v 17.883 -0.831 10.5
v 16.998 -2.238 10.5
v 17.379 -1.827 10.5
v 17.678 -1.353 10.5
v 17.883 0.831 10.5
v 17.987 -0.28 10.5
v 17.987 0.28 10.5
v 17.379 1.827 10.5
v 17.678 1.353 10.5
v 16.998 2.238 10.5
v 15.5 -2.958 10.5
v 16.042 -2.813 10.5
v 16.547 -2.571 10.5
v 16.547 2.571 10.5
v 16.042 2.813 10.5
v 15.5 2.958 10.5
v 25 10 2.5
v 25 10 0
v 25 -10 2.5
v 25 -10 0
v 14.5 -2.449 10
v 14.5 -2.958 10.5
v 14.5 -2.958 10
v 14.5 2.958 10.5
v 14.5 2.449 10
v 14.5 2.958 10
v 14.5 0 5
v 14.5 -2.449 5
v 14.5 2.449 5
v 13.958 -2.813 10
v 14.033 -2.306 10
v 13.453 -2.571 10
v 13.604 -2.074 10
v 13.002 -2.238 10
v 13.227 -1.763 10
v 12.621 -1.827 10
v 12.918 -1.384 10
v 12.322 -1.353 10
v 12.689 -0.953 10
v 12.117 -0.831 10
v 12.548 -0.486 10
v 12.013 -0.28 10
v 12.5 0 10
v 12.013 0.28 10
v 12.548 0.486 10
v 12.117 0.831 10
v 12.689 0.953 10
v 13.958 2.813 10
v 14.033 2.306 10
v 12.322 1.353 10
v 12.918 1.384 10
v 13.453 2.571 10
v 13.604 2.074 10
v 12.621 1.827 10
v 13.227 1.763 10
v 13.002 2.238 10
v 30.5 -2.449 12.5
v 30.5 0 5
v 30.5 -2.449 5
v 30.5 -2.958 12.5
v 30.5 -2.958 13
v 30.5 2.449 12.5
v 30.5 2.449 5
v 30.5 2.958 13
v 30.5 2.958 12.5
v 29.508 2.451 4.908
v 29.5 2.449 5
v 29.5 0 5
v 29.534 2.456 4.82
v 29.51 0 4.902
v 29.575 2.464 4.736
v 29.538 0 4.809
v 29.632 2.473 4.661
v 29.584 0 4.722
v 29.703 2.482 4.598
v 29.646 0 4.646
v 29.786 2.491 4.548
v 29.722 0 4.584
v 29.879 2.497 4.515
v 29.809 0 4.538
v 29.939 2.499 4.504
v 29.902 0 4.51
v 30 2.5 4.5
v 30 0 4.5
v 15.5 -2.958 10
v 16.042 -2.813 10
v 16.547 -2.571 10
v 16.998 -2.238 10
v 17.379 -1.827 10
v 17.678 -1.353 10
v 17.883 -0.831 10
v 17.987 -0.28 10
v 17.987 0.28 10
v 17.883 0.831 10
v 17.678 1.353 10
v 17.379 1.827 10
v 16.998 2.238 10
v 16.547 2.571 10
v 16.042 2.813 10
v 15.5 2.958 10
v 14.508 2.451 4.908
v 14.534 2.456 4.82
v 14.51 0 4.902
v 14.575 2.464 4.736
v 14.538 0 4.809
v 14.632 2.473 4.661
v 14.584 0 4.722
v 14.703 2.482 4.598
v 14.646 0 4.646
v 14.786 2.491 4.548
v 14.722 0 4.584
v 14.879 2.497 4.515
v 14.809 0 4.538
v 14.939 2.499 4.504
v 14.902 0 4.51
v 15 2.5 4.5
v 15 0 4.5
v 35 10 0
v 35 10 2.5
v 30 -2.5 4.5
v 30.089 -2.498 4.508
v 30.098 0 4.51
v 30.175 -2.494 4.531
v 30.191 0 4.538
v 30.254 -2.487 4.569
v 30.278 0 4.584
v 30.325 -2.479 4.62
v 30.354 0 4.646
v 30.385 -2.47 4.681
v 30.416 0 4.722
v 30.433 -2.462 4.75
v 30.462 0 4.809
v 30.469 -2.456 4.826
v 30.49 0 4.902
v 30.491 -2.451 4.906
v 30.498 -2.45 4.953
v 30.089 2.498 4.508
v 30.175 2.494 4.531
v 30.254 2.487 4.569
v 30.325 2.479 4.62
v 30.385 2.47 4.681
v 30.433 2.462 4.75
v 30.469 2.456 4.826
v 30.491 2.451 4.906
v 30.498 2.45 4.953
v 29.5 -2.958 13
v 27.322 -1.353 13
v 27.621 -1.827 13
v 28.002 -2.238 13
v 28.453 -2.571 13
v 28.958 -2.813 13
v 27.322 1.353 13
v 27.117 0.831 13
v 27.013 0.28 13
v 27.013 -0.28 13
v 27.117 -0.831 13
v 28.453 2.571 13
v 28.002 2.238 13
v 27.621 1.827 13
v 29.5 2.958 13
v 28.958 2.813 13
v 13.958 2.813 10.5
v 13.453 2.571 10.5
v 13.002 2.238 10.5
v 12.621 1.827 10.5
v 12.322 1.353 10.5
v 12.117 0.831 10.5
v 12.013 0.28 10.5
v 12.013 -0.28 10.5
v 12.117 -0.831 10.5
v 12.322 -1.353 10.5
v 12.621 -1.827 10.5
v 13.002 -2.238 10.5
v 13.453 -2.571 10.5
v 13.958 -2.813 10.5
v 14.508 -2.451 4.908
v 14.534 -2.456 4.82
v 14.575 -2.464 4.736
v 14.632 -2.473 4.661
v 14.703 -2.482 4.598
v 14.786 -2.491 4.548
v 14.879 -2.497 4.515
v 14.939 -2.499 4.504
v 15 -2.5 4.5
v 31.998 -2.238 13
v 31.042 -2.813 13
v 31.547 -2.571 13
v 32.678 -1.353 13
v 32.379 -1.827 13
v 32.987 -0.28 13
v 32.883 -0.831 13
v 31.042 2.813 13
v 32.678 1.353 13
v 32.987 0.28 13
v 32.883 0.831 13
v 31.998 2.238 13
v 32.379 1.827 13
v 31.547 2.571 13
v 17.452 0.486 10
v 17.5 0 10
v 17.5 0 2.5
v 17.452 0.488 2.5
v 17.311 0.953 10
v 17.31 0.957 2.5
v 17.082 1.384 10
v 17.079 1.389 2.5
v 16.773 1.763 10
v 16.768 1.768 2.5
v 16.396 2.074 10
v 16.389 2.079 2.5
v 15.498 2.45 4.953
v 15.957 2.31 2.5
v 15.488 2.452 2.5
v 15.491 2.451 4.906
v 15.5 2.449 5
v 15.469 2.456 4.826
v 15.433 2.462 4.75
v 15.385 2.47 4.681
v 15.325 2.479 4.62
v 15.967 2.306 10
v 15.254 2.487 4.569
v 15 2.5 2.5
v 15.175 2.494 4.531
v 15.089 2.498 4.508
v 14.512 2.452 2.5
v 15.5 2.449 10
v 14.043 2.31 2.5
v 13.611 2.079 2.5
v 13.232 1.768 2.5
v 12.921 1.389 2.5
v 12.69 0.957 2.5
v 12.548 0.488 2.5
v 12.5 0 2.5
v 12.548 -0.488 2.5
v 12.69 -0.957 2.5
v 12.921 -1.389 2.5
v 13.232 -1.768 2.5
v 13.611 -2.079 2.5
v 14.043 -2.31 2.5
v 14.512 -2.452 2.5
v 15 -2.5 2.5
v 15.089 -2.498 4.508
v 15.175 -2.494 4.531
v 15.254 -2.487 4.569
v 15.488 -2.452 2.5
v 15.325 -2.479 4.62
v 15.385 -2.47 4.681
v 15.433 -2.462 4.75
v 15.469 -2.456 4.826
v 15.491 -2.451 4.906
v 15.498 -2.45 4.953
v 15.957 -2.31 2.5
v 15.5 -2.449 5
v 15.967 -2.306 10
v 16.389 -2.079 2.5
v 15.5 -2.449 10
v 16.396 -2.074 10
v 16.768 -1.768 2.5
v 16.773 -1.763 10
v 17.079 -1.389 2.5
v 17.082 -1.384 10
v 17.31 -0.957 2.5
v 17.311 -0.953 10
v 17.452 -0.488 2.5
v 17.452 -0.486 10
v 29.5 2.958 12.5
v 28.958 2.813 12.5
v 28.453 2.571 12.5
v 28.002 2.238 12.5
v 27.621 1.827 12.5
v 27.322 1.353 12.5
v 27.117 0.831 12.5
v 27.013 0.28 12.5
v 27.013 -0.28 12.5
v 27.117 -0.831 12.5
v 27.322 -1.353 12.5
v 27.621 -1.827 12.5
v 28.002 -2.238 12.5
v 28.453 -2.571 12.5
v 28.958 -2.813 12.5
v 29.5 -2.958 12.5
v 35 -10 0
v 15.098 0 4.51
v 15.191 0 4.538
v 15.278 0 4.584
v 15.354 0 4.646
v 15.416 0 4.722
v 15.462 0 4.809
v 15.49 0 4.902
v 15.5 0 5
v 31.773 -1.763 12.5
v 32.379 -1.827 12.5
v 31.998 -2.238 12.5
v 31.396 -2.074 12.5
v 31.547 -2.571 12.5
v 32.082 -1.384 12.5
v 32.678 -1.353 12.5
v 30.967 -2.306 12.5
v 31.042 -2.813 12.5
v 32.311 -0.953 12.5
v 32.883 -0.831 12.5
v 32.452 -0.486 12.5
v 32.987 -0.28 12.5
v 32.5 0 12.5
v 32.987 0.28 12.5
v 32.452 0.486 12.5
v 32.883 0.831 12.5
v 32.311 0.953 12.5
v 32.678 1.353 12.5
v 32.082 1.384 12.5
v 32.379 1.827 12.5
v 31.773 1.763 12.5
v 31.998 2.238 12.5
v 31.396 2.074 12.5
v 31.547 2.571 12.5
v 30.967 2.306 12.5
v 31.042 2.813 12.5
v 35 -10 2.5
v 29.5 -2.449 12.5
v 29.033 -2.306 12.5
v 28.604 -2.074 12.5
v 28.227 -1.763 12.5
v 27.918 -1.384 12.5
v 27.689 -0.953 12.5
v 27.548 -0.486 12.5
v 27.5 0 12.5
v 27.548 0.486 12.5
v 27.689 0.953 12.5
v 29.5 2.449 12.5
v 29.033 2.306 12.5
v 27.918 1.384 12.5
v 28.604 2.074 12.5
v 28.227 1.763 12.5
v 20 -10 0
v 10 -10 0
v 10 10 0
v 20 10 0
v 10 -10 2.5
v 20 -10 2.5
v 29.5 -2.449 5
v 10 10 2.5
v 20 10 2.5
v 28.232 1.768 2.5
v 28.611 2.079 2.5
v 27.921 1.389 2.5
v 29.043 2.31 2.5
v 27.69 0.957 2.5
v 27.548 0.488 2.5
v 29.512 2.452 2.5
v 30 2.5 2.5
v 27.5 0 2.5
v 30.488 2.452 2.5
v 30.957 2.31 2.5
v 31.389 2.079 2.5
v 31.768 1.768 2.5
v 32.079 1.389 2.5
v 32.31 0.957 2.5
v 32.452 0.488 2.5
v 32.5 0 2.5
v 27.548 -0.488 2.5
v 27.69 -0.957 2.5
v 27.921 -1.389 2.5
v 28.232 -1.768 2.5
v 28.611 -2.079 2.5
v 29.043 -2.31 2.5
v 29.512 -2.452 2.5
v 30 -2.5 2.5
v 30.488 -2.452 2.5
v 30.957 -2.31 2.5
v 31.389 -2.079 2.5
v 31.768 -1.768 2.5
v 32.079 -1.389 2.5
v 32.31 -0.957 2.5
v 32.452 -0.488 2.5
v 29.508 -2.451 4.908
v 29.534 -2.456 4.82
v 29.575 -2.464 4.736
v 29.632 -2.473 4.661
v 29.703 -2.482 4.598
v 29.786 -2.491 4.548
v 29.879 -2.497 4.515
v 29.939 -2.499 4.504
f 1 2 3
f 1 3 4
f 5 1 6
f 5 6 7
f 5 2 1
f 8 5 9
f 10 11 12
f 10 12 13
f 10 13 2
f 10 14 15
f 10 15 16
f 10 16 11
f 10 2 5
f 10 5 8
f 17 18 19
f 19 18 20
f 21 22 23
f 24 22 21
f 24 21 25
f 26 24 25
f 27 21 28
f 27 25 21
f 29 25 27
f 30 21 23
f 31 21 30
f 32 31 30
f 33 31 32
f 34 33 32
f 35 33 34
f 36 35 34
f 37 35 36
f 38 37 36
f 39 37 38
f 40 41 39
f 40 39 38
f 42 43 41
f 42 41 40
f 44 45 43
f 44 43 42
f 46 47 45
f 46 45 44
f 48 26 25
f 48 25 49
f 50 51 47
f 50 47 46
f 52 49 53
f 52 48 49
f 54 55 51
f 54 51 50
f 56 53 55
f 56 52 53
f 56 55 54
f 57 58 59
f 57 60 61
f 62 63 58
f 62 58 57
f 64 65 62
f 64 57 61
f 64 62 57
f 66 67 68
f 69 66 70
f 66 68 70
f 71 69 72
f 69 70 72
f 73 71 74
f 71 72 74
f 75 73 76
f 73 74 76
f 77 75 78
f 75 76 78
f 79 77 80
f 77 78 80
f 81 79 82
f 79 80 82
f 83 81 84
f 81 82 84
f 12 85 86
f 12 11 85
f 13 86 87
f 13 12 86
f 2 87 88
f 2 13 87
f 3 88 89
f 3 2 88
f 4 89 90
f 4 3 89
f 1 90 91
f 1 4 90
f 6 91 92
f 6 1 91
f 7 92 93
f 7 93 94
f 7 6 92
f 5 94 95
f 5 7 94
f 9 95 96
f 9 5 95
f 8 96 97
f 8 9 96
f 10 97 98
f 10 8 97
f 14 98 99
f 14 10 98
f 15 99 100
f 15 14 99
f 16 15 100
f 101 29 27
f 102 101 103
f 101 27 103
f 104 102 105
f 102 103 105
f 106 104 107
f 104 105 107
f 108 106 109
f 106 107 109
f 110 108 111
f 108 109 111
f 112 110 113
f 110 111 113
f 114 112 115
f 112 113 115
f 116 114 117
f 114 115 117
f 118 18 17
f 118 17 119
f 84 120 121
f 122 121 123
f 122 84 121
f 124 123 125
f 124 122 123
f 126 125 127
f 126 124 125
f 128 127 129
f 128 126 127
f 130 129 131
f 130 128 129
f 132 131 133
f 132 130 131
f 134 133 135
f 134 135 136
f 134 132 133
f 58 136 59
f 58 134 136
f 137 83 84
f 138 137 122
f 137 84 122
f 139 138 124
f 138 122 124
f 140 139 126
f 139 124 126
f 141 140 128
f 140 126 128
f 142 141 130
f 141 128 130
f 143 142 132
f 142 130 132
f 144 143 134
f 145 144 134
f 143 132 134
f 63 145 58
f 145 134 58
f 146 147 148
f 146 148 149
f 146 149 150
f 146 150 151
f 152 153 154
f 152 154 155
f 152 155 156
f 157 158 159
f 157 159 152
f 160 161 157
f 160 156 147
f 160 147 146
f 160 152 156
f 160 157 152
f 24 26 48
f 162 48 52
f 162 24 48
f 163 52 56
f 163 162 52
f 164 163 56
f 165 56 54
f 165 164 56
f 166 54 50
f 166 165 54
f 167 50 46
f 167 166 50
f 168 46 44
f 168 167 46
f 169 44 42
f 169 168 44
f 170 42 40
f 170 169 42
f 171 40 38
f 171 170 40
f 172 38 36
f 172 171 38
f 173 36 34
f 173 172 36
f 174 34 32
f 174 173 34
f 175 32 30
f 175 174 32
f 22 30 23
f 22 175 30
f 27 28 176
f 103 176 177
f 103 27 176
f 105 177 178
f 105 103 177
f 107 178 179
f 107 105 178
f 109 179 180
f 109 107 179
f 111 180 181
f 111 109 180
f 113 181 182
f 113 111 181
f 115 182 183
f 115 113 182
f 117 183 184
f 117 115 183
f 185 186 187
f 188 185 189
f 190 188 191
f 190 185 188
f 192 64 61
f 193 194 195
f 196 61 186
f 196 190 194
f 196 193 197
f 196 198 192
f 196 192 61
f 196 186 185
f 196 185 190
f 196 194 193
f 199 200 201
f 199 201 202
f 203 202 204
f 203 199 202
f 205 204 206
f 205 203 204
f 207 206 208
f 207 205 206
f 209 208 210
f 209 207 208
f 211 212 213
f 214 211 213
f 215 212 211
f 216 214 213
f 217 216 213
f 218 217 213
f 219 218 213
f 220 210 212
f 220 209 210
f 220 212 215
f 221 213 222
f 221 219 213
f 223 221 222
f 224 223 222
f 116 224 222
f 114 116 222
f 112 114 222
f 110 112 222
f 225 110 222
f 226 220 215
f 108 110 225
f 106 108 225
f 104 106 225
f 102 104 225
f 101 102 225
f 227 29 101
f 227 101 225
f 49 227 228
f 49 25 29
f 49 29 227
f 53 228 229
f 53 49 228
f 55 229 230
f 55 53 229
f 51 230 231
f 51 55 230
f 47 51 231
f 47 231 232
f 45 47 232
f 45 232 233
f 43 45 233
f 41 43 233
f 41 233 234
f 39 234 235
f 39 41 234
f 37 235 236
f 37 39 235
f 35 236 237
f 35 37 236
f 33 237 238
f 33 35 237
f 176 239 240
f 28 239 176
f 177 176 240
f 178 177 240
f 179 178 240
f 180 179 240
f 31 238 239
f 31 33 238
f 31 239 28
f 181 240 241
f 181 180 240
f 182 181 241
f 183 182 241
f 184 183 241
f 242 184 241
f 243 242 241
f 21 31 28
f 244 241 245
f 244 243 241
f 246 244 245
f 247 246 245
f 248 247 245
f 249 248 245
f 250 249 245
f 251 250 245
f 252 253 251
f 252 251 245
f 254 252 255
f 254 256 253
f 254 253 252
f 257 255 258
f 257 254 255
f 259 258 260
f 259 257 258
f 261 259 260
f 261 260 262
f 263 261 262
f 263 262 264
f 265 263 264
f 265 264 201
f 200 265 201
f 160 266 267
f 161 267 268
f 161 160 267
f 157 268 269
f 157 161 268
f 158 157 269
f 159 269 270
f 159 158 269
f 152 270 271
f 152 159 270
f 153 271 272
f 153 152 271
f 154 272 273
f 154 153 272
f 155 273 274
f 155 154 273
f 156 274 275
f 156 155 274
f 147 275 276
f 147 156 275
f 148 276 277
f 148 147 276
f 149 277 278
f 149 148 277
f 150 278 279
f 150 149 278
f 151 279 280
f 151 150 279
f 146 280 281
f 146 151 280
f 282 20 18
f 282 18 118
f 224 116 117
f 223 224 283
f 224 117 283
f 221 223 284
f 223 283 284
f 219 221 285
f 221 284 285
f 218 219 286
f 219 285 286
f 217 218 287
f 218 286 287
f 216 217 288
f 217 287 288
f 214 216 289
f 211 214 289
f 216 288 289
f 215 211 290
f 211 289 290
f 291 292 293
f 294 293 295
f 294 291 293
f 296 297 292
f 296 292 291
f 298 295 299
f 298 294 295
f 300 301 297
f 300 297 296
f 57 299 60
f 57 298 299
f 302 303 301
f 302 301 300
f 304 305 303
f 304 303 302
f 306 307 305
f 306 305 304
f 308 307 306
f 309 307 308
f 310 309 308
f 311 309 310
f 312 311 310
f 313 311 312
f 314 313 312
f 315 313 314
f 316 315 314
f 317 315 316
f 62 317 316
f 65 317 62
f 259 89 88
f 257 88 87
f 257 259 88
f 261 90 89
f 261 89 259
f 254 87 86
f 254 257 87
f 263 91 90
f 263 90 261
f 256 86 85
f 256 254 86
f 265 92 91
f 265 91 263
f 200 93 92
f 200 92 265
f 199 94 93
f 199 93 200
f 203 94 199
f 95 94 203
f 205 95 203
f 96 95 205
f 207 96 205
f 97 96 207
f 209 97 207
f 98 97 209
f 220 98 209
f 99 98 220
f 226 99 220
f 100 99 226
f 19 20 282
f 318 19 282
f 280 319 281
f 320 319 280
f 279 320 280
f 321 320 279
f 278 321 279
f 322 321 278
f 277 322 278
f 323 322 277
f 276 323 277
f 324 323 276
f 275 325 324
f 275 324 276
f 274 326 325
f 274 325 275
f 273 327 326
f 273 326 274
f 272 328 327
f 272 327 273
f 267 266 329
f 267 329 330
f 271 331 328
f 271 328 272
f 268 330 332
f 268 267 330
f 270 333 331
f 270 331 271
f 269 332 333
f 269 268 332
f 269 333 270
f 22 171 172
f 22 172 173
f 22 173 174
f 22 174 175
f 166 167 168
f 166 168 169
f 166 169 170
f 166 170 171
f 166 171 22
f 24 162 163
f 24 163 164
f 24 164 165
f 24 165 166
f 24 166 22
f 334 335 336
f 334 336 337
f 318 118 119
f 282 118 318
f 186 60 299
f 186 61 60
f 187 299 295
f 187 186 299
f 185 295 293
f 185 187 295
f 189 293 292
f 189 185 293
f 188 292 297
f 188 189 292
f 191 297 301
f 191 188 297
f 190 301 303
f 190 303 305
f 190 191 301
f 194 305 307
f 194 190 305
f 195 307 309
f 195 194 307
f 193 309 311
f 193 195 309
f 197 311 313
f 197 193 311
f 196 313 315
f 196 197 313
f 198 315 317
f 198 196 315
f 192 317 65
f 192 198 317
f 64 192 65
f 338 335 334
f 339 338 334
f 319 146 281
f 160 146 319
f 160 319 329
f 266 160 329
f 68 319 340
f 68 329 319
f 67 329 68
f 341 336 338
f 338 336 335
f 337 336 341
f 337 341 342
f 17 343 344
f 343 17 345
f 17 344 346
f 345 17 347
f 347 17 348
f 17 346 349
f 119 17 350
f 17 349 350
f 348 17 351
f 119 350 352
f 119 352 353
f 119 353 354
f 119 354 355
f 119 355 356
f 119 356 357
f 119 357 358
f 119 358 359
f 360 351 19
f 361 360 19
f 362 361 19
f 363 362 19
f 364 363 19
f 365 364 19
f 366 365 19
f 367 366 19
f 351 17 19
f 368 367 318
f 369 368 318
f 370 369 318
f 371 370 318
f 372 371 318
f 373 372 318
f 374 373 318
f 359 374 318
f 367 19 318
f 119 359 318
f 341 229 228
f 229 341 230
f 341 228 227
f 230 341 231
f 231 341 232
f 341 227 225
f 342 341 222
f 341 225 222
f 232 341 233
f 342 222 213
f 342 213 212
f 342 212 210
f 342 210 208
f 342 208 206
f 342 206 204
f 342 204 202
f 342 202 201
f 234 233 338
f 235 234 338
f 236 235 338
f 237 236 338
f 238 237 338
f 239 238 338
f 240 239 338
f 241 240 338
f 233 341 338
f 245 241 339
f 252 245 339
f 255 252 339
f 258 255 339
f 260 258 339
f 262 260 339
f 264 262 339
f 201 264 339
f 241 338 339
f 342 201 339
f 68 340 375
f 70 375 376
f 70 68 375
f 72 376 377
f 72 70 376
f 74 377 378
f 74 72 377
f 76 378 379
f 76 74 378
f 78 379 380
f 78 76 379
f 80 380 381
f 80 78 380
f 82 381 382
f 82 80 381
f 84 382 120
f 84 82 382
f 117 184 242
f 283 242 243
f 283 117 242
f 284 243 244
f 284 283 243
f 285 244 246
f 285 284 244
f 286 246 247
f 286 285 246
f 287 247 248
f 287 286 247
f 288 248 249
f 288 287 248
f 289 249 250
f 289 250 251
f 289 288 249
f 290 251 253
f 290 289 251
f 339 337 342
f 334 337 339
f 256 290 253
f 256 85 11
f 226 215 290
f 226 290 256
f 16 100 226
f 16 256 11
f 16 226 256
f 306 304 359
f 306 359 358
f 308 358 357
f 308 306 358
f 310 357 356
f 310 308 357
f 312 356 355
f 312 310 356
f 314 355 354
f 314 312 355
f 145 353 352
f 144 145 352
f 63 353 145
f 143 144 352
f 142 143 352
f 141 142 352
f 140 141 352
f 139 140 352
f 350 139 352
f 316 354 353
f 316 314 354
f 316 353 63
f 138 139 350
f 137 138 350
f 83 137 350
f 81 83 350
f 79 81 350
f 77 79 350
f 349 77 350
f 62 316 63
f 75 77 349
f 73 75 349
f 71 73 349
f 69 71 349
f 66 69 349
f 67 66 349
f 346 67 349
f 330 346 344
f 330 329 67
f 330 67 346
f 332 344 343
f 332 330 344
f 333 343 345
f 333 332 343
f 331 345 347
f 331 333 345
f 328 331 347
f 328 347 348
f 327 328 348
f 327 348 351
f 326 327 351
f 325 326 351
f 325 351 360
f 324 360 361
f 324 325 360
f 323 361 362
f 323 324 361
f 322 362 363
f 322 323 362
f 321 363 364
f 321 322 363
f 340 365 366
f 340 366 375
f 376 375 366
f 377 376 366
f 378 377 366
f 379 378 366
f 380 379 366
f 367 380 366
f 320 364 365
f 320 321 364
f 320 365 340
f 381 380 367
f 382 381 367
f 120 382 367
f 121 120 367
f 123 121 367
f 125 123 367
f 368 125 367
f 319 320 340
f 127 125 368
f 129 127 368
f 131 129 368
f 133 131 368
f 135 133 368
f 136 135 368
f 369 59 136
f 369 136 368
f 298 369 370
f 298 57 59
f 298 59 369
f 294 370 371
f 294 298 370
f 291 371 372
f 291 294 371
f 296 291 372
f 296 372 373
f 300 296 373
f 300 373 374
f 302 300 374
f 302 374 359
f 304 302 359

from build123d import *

# Parameters (mm, degrees)
F5_DEPTH      = 25
F5_DEPTH_BACK = 25
F6_W          = 10
F6_H          = 10
F7_DEPTH      = 2.5
F6_H_2        = 20


with BuildPart() as f1:
    # F0 (on Front) → F1 (revolve)
    with BuildSketch(Plane.XZ):
        Polygon((3, 8), (0, 8), (0, 0), (5, 0), (5, 2.5), (2.5, 2.5), (2.5, 7.5), (3, 7.5), align=None)
    revolve(axis=Axis((0, 0, 8.1081883982), (0, 0, 1)))


with BuildPart() as f2:
    # F0 (on Front) → F2 (revolve)
    with BuildSketch(Plane.XZ):
        Polygon((18, 10.5), (15, 10.5), (15, 0), (20, 0), (20, 2.5), (17.5, 2.5), (17.5, 10), (18, 10), align=None)
    revolve(axis=Axis((15, 0, 7.5201606378), (0, 0, 1)))


with BuildPart() as f3:
    # F0 (on Front) → F3 (revolve)
    with BuildSketch(Plane.XZ):
        Polygon((33, 13), (30, 13), (30, 0), (35, 0), (35, 2.5), (32.5, 2.5), (32.5, 12.5), (33, 12.5), align=None)
    revolve(axis=Axis((30, 0, 13.954574092), (0, 0, 1)))


with BuildPart() as f5_tool:
    # F4 (on Front) → F5 (new body, two sides)
    with BuildSketch(Plane.XZ) as f5_sk:
        with BuildLine():
            Line((0.5, 8), (0, 8))
            Line((0, 8), (-0.5, 8))
            Line((-0.5, 8), (-0.5, 5))
            ThreePointArc((-0.5, 5), (-0.3535533906, 4.6464466094), (0, 4.5))
            ThreePointArc((0, 4.5), (0.3535533906, 4.6464466094), (0.5, 5))
            Line((0.5, 5), (0.5, 8))
        make_face()
        with BuildLine():
            Line((15.5, 10.5), (15, 10.5))
            Line((15, 10.5), (14.5, 10.5))
            Line((14.5, 10.5), (14.5, 5))
            ThreePointArc((14.5, 5), (14.6464466094, 4.6464466094), (15, 4.5))
            ThreePointArc((15, 4.5), (15.3535533906, 4.6464466094), (15.5, 5))
            Line((15.5, 5), (15.5, 10.5))
        make_face()
        with BuildLine():
            Line((30.5, 13), (30, 13))
            Line((30, 13), (29.5, 13))
            Line((29.5, 13), (29.5, 5))
            ThreePointArc((29.5, 5), (29.6464466094, 4.6464466094), (30, 4.5))
            ThreePointArc((30, 4.5), (30.3535533906, 4.6464466094), (30.5, 5))
            Line((30.5, 5), (30.5, 13))
        make_face()
    extrude(amount=-F5_DEPTH)
    extrude(f5_sk.sketch, amount=F5_DEPTH_BACK)


with BuildPart() as f1_1:
    add(f1.part)

    # F5: cut by f5_tool
    add(f5_tool.part, mode=Mode.SUBTRACT)

    # F6 (on face) → F7 (join, through all)
    with BuildSketch(Plane(origin=(0, 0, 0), x_dir=(1, 0, 0), z_dir=(0, 0, -1))):
        Rectangle(F6_W, F6_H)
    extrude(amount=-F7_DEPTH)


with BuildPart() as f2_1:
    add(f2.part)

    # F5: cut by f5_tool
    add(f5_tool.part, mode=Mode.SUBTRACT)

    # F6 (on face) → F7, piece 2 (join, through all)
    with BuildSketch(Plane(origin=(0, 0, 0), x_dir=(1, 0, 0), z_dir=(0, 0, -1))):
        with Locations((15, 0)):
            Rectangle(F6_W, F6_H_2)
    extrude(amount=-F7_DEPTH)


with BuildPart() as f3_1:
    add(f3.part)

    # F5: cut by f5_tool
    add(f5_tool.part, mode=Mode.SUBTRACT)

    # F6 (on face) → F7, piece 3 (join, through all)
    with BuildSketch(Plane(origin=(0, 0, 0), x_dir=(1, 0, 0), z_dir=(0, 0, -1))):
        with Locations((30, 0)):
            Rectangle(F6_W, F6_H_2)
    extrude(amount=-F7_DEPTH)


solid = Compound([f2_1.part, f3_1.part])
